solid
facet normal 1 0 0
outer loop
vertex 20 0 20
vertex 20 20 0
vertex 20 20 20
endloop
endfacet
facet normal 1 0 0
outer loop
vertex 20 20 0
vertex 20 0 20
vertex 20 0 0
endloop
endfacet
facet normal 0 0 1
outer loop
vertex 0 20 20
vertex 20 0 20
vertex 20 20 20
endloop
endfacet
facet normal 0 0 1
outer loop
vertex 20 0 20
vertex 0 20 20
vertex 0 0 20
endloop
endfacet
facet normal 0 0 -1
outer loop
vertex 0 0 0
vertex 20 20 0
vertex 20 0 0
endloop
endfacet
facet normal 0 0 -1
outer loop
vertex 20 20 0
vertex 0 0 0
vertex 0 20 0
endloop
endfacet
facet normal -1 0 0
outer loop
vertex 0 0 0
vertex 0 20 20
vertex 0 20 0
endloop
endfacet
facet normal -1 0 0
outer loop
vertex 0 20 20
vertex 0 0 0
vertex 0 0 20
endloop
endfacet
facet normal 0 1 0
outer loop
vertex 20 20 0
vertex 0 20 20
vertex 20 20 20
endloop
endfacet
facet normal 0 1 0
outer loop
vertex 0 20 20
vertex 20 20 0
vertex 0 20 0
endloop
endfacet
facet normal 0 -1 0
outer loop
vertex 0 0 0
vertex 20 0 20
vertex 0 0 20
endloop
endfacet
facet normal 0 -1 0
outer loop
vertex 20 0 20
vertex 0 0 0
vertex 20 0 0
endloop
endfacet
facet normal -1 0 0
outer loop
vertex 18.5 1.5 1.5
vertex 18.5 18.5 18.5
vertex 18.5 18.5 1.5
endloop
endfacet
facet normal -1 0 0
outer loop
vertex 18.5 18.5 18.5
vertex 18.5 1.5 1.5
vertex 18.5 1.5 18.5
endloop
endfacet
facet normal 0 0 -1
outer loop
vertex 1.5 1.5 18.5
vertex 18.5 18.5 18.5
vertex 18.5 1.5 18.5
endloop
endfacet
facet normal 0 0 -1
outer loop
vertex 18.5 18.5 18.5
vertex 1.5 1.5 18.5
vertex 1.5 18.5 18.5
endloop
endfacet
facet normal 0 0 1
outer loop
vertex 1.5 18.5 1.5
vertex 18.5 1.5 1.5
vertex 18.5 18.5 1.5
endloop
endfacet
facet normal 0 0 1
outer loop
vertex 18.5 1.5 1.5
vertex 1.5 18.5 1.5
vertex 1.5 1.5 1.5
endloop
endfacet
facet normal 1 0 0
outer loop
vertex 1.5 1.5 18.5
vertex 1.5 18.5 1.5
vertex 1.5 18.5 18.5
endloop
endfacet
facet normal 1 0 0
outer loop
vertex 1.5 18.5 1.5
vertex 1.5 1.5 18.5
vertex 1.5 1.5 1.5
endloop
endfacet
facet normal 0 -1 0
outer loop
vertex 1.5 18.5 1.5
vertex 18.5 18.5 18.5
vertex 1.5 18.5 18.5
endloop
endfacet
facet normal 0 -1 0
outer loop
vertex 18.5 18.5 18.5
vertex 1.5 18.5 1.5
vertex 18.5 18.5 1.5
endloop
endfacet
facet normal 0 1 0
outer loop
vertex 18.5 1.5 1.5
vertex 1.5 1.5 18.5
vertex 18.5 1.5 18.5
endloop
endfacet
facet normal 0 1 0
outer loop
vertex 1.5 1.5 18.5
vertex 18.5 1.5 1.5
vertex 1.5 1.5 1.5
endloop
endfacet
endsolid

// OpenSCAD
wanddicke=1.5;
//Außenmaße
hoehe=20;
breite=20;
laenge=20;

difference(){
cube([breite,laenge,hoehe]);
translate([wanddicke,wanddicke,wanddicke])
cube([breite-2*wanddicke,laenge-2*wanddicke,hoehe-2*wanddicke]);
}
